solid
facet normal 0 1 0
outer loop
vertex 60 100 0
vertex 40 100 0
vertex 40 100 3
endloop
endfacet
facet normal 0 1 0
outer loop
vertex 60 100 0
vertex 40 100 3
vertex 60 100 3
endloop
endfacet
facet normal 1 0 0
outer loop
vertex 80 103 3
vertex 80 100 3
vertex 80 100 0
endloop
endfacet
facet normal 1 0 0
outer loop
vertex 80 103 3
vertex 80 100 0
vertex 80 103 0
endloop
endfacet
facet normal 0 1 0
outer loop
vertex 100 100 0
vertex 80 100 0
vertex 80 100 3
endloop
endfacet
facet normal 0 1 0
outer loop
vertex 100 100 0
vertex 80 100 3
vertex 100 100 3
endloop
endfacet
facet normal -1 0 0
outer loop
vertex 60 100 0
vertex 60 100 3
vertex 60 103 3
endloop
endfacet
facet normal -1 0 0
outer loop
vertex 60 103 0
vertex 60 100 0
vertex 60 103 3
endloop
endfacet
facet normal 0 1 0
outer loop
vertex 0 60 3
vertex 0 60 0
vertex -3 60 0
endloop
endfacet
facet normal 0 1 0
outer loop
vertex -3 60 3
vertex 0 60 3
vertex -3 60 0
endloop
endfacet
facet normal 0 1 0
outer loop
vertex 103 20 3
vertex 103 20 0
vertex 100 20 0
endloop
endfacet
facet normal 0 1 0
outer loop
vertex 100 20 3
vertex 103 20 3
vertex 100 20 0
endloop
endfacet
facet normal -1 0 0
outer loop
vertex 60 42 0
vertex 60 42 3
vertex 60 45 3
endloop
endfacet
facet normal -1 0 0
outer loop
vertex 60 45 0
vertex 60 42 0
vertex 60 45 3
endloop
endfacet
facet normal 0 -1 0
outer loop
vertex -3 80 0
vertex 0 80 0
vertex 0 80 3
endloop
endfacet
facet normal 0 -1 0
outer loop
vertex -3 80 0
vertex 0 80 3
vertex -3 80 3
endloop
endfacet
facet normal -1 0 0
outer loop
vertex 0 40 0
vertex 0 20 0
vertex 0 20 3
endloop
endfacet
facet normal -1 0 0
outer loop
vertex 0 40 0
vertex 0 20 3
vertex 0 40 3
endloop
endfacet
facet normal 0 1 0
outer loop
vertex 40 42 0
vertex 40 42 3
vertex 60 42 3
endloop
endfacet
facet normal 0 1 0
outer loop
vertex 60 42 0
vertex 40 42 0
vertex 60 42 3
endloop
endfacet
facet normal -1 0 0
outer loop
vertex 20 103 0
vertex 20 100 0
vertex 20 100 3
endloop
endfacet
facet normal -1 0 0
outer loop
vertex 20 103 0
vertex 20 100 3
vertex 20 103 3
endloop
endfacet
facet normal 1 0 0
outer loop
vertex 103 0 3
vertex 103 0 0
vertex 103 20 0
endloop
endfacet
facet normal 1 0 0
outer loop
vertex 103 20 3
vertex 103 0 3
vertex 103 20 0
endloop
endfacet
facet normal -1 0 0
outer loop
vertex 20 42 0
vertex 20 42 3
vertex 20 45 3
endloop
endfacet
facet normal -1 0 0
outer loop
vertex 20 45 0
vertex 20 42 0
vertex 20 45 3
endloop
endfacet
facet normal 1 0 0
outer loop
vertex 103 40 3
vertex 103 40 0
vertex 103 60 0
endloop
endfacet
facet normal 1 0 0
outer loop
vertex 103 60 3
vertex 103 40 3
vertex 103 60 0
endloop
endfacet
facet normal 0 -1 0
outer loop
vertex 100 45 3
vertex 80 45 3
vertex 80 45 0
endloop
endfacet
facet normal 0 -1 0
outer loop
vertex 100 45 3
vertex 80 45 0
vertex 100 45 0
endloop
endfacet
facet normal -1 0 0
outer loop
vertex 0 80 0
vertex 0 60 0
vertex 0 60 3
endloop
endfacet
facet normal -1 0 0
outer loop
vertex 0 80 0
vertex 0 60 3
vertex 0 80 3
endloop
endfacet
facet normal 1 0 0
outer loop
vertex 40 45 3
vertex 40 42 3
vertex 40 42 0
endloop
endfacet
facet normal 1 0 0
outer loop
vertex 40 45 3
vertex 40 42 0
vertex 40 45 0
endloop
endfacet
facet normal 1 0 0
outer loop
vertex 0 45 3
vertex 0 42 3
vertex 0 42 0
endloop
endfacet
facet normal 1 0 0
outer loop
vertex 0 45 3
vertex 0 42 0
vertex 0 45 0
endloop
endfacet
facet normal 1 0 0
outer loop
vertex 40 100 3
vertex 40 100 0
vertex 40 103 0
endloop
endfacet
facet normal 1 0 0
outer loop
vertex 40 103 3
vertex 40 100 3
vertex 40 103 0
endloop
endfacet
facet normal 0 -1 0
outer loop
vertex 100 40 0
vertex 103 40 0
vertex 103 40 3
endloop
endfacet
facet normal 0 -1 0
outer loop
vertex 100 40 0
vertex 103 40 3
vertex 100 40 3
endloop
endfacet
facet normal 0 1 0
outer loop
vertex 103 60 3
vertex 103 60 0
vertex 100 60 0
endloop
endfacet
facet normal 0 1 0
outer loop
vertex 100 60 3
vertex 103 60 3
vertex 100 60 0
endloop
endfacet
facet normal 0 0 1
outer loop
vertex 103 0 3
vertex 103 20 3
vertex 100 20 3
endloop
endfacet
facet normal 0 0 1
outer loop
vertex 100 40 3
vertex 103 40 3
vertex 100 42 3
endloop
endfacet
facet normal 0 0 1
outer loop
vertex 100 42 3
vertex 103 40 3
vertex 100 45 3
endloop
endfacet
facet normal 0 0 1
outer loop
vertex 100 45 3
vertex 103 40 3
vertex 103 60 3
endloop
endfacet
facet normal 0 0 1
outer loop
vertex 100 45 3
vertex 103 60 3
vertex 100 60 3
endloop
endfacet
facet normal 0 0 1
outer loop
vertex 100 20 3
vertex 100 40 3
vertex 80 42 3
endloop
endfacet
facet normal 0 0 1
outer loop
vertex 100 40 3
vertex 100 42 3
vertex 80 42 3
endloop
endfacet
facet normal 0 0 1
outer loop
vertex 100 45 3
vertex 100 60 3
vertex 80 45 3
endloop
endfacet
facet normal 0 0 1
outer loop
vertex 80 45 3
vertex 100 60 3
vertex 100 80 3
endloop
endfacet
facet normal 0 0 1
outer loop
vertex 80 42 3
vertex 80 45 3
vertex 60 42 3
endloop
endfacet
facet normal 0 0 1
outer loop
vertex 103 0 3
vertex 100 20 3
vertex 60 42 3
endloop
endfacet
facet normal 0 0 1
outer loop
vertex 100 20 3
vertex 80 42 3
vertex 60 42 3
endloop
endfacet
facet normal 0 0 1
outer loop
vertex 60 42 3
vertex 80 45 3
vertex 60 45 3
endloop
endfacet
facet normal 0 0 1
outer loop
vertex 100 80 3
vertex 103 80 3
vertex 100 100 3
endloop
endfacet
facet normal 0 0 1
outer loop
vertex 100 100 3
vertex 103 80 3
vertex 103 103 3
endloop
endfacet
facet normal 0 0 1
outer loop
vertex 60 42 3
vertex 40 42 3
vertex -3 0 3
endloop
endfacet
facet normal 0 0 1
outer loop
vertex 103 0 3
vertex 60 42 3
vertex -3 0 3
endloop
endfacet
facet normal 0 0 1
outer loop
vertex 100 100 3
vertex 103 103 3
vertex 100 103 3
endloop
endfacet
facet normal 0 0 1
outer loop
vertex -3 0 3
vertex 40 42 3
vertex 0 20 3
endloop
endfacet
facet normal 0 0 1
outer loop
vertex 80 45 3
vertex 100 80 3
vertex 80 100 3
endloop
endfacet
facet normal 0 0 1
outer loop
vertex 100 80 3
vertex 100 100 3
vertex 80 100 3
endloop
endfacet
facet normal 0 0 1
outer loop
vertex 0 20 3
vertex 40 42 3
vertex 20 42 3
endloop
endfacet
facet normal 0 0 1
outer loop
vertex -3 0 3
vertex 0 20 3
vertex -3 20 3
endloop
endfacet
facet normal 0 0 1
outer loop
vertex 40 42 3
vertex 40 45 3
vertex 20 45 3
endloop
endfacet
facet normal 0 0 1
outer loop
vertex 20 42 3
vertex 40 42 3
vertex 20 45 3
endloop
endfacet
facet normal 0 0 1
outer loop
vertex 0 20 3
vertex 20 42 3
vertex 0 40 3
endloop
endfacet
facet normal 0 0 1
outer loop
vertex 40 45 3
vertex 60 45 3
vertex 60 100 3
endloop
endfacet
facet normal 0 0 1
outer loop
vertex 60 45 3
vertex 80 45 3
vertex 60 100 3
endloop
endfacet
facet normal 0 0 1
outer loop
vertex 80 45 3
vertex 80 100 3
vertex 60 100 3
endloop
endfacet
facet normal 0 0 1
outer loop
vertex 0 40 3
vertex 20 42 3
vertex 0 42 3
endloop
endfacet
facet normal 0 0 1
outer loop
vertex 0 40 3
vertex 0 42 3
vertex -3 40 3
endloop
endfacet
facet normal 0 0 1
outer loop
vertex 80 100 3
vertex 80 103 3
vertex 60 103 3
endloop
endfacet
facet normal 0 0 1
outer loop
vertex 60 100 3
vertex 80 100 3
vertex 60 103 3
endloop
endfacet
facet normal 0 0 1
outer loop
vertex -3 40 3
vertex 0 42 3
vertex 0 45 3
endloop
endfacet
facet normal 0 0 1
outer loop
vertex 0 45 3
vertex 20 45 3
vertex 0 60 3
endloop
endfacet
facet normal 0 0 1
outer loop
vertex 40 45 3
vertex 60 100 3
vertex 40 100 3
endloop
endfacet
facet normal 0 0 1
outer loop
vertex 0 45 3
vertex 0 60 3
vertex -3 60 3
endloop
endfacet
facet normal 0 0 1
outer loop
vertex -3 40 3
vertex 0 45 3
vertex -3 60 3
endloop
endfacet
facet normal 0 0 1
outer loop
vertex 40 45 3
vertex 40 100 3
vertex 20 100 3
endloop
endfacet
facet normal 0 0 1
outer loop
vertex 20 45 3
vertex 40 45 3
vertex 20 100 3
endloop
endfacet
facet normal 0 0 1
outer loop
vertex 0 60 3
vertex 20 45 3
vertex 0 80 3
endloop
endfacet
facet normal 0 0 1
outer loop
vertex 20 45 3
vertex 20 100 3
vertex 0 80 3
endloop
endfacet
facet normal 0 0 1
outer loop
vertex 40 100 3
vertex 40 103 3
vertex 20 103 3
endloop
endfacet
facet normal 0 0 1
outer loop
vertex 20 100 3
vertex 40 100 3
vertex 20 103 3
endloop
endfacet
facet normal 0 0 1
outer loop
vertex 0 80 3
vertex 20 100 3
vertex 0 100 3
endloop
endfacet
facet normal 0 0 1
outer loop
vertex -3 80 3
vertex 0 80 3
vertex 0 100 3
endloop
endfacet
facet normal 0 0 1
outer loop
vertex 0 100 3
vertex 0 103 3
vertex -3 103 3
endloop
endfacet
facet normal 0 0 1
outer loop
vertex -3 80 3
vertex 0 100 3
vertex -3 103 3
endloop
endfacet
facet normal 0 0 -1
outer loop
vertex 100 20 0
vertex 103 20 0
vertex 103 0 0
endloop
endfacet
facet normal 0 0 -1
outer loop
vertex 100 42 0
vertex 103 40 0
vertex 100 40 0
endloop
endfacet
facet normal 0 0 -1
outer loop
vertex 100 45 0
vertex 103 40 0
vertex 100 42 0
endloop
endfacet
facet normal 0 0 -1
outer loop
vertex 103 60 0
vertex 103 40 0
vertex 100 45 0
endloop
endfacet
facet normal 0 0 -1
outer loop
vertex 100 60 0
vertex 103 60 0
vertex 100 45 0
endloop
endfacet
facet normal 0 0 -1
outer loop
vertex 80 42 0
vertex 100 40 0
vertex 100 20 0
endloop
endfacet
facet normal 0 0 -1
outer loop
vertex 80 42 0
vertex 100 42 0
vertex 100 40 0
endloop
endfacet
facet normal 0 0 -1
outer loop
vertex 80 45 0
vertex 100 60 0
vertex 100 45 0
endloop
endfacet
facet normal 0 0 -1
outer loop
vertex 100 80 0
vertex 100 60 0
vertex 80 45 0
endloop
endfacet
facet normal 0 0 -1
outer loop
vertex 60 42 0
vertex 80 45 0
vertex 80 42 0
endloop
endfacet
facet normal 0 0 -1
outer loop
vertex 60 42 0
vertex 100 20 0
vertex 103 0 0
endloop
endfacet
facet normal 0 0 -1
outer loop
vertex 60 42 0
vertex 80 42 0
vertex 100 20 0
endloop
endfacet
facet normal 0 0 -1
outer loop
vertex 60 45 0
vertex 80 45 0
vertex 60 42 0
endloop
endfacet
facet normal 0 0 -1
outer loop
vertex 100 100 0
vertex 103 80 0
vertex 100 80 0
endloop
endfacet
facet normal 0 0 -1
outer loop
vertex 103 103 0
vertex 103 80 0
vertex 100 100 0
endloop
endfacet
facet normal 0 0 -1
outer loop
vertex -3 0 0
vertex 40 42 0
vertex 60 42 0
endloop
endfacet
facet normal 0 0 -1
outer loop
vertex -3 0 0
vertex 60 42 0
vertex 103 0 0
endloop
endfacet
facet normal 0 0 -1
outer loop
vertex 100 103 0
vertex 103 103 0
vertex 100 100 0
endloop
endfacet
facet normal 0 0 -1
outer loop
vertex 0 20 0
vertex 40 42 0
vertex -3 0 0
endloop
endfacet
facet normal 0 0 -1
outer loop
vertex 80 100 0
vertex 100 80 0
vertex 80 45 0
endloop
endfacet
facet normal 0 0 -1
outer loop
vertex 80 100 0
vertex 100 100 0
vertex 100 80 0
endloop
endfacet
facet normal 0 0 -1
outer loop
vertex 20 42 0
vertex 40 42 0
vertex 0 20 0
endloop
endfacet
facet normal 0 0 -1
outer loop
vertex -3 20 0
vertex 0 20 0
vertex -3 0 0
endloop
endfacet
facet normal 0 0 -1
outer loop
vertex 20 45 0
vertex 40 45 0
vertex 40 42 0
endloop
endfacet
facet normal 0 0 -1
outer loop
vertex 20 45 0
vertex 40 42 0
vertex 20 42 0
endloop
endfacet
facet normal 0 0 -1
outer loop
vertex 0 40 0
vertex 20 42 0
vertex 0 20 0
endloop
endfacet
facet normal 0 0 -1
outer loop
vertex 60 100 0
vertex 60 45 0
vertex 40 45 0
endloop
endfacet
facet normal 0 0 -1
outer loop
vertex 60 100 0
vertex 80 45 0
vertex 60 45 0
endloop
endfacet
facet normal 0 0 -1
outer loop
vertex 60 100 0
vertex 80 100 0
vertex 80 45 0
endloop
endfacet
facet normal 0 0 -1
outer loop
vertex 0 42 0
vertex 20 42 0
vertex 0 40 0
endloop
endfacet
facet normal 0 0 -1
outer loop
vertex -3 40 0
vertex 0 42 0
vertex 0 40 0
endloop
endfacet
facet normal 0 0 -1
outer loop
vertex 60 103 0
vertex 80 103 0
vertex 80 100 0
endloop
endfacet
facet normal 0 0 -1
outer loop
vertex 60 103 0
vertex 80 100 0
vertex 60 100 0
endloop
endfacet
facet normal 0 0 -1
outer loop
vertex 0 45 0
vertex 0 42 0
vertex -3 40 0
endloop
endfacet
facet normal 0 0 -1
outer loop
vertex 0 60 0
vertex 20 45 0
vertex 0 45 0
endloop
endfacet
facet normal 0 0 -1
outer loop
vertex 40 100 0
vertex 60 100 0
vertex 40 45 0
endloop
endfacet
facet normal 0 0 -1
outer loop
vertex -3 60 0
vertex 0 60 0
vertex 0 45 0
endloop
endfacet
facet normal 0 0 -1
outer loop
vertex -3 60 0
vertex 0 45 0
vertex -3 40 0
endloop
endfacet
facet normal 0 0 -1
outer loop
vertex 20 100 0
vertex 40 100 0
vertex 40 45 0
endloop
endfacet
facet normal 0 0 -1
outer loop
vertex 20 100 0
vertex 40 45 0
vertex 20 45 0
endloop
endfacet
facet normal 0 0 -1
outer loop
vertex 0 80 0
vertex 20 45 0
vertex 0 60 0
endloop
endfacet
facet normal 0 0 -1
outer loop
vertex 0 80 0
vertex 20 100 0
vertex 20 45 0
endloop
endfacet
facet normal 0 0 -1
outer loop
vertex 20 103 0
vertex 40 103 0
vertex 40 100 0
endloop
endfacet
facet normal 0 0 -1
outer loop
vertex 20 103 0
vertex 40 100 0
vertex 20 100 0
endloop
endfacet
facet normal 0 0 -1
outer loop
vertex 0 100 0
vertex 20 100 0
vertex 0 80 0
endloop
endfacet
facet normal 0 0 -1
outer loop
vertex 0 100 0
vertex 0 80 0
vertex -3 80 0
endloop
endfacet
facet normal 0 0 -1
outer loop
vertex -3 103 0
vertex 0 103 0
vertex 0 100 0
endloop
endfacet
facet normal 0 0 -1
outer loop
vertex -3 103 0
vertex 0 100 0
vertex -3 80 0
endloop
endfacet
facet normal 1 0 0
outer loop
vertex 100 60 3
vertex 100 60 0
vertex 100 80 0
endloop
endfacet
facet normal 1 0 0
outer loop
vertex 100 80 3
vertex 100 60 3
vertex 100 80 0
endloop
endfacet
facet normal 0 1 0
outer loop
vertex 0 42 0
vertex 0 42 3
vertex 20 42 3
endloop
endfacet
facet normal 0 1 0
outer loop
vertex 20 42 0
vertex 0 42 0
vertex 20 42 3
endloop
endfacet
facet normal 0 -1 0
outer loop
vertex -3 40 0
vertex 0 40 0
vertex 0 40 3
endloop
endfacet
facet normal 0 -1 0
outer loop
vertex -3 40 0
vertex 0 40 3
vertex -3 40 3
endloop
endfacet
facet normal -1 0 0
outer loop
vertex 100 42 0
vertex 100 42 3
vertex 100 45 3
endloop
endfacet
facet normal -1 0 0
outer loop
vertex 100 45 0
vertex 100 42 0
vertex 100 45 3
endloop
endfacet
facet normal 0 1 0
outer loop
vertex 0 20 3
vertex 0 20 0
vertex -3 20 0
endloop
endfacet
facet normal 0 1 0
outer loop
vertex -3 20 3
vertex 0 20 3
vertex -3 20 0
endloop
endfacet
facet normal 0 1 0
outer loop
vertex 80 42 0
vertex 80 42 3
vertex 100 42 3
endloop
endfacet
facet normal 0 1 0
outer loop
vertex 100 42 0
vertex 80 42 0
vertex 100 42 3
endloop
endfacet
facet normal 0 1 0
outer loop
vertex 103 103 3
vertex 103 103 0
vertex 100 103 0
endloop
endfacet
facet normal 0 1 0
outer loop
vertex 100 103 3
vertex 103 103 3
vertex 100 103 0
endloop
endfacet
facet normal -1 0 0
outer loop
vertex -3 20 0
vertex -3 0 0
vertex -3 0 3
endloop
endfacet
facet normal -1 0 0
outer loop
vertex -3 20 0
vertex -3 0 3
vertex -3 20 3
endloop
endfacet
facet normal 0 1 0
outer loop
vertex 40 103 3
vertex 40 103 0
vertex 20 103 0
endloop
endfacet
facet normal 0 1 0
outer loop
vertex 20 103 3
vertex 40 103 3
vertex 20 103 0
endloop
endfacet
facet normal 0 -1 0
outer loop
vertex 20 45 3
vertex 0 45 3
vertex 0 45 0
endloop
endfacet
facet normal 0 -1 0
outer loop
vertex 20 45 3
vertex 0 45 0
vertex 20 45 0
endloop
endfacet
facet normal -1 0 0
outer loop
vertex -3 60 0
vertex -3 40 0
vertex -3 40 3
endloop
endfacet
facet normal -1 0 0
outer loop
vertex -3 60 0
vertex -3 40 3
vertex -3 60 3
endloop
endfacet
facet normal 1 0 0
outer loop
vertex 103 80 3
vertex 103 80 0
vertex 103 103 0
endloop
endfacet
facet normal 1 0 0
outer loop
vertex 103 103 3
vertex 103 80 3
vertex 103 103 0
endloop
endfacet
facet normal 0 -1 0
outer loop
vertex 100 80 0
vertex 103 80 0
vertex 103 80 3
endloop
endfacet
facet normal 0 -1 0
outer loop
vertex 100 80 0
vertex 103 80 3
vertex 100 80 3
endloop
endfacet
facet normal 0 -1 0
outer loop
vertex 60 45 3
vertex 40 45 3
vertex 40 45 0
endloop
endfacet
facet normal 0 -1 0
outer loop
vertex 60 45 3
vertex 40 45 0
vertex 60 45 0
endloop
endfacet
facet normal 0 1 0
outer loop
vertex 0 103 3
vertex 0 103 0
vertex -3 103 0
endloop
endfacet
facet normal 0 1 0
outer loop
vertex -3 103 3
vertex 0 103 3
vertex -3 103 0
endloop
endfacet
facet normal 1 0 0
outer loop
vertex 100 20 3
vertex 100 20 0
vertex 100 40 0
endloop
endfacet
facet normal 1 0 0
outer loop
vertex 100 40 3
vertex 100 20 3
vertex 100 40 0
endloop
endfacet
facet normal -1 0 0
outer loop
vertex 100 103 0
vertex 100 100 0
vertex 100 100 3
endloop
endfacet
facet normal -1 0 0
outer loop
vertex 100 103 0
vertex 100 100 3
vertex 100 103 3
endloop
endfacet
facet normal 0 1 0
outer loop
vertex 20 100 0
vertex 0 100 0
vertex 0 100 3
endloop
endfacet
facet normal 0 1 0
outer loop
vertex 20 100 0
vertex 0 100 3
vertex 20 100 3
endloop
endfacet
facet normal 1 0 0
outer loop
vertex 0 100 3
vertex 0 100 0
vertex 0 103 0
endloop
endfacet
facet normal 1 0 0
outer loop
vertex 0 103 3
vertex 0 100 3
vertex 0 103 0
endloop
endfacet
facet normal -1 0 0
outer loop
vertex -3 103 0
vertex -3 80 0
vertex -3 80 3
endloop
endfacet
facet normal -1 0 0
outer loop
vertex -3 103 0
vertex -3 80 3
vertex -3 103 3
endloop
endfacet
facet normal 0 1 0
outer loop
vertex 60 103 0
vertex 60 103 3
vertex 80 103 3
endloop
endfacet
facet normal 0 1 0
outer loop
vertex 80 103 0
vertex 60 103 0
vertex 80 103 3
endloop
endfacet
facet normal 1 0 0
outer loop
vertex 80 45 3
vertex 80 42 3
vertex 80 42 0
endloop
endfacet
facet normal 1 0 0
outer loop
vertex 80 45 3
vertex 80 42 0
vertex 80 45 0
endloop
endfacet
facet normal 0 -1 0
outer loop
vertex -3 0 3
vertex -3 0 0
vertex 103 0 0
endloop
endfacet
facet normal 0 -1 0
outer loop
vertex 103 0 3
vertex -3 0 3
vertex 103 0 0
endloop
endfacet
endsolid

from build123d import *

# Parameters (mm, degrees)
SKETCH1_W           = 100
SKETCH1_H           = 100
BOSS_EXTRUDE1_DEPTH = 3
SKETCH2_W           = 20
SKETCH2_H           = 3
BOSS_EXTRUDE3_DEPTH = 3
SKETCH3_W           = 20
SKETCH3_H           = 3
BOSS_EXTRUDE4_DEPTH = 3
SKETCH5_W           = 3
SKETCH5_H           = 23
SKETCH5_H_2         = 20
BOSS_EXTRUDE5_DEPTH = 3
SKETCH6_W           = 3
SKETCH6_H           = 23
SKETCH6_H_2         = 20
BOSS_EXTRUDE6_DEPTH = 3
SKETCH7_W           = 20
SKETCH7_H           = 3
CUT_EXTRUDE1_DEPTH  = 3


with BuildPart() as part:
    # Sketch1 → Boss-Extrude1 (new body)
    with BuildSketch(Plane.XY):
        with Locations((50, 50)):
            Rectangle(SKETCH1_W, SKETCH1_H)
    extrude(amount=BOSS_EXTRUDE1_DEPTH)

    # Sketch2 → Boss-Extrude3 (add)
    with BuildSketch(Plane(origin=(0, 0, 0), x_dir=(-1, 0, 0), z_dir=(0, 0, -1))):
        with Locations((-30, 101.5)):
            Rectangle(SKETCH2_W, SKETCH2_H)
    extrude(amount=-BOSS_EXTRUDE3_DEPTH)

    # Sketch3 → Boss-Extrude4 (add)
    with BuildSketch(Plane.XY.offset(3)):
        with Locations((70, 101.5)):
            Rectangle(SKETCH3_W, SKETCH3_H)
    extrude(amount=-BOSS_EXTRUDE4_DEPTH)

    # Sketch5 → Boss-Extrude5 (add)
    with BuildSketch(Plane(origin=(0, 0, 0), x_dir=(-1, 0, 0), z_dir=(0, 0, -1))):
        with Locations((-101.5, 91.5)):
            Rectangle(SKETCH5_W, SKETCH5_H)
        with Locations((-101.5, 50)):
            Rectangle(SKETCH5_W, SKETCH5_H_2)
        with Locations((-101.5, 10)):
            Rectangle(SKETCH5_W, SKETCH5_H_2)
    extrude(amount=-BOSS_EXTRUDE5_DEPTH)

    # Sketch6 → Boss-Extrude6 (add)
    with BuildSketch(Plane(origin=(0, 0, 0), x_dir=(-1, 0, 0), z_dir=(0, 0, -1))):
        with Locations((1.5, 91.5)):
            Rectangle(SKETCH6_W, SKETCH6_H)
        with Locations((1.5, 50)):
            Rectangle(SKETCH6_W, SKETCH6_H_2)
        with Locations((1.5, 10)):
            Rectangle(SKETCH6_W, SKETCH6_H_2)
    extrude(amount=-BOSS_EXTRUDE6_DEPTH)

    # Sketch7 → Cut-Extrude1 (cut)
    with BuildSketch(Plane.XY.offset(3)):
        with Locations((10, 43.5)):
            Rectangle(SKETCH7_W, SKETCH7_H)
        with Locations((50, 43.5)):
            Rectangle(SKETCH7_W, SKETCH7_H)
        with Locations((90, 43.5)):
            Rectangle(SKETCH7_W, SKETCH7_H)
    extrude(amount=-CUT_EXTRUDE1_DEPTH, mode=Mode.SUBTRACT)


solid = part.part
